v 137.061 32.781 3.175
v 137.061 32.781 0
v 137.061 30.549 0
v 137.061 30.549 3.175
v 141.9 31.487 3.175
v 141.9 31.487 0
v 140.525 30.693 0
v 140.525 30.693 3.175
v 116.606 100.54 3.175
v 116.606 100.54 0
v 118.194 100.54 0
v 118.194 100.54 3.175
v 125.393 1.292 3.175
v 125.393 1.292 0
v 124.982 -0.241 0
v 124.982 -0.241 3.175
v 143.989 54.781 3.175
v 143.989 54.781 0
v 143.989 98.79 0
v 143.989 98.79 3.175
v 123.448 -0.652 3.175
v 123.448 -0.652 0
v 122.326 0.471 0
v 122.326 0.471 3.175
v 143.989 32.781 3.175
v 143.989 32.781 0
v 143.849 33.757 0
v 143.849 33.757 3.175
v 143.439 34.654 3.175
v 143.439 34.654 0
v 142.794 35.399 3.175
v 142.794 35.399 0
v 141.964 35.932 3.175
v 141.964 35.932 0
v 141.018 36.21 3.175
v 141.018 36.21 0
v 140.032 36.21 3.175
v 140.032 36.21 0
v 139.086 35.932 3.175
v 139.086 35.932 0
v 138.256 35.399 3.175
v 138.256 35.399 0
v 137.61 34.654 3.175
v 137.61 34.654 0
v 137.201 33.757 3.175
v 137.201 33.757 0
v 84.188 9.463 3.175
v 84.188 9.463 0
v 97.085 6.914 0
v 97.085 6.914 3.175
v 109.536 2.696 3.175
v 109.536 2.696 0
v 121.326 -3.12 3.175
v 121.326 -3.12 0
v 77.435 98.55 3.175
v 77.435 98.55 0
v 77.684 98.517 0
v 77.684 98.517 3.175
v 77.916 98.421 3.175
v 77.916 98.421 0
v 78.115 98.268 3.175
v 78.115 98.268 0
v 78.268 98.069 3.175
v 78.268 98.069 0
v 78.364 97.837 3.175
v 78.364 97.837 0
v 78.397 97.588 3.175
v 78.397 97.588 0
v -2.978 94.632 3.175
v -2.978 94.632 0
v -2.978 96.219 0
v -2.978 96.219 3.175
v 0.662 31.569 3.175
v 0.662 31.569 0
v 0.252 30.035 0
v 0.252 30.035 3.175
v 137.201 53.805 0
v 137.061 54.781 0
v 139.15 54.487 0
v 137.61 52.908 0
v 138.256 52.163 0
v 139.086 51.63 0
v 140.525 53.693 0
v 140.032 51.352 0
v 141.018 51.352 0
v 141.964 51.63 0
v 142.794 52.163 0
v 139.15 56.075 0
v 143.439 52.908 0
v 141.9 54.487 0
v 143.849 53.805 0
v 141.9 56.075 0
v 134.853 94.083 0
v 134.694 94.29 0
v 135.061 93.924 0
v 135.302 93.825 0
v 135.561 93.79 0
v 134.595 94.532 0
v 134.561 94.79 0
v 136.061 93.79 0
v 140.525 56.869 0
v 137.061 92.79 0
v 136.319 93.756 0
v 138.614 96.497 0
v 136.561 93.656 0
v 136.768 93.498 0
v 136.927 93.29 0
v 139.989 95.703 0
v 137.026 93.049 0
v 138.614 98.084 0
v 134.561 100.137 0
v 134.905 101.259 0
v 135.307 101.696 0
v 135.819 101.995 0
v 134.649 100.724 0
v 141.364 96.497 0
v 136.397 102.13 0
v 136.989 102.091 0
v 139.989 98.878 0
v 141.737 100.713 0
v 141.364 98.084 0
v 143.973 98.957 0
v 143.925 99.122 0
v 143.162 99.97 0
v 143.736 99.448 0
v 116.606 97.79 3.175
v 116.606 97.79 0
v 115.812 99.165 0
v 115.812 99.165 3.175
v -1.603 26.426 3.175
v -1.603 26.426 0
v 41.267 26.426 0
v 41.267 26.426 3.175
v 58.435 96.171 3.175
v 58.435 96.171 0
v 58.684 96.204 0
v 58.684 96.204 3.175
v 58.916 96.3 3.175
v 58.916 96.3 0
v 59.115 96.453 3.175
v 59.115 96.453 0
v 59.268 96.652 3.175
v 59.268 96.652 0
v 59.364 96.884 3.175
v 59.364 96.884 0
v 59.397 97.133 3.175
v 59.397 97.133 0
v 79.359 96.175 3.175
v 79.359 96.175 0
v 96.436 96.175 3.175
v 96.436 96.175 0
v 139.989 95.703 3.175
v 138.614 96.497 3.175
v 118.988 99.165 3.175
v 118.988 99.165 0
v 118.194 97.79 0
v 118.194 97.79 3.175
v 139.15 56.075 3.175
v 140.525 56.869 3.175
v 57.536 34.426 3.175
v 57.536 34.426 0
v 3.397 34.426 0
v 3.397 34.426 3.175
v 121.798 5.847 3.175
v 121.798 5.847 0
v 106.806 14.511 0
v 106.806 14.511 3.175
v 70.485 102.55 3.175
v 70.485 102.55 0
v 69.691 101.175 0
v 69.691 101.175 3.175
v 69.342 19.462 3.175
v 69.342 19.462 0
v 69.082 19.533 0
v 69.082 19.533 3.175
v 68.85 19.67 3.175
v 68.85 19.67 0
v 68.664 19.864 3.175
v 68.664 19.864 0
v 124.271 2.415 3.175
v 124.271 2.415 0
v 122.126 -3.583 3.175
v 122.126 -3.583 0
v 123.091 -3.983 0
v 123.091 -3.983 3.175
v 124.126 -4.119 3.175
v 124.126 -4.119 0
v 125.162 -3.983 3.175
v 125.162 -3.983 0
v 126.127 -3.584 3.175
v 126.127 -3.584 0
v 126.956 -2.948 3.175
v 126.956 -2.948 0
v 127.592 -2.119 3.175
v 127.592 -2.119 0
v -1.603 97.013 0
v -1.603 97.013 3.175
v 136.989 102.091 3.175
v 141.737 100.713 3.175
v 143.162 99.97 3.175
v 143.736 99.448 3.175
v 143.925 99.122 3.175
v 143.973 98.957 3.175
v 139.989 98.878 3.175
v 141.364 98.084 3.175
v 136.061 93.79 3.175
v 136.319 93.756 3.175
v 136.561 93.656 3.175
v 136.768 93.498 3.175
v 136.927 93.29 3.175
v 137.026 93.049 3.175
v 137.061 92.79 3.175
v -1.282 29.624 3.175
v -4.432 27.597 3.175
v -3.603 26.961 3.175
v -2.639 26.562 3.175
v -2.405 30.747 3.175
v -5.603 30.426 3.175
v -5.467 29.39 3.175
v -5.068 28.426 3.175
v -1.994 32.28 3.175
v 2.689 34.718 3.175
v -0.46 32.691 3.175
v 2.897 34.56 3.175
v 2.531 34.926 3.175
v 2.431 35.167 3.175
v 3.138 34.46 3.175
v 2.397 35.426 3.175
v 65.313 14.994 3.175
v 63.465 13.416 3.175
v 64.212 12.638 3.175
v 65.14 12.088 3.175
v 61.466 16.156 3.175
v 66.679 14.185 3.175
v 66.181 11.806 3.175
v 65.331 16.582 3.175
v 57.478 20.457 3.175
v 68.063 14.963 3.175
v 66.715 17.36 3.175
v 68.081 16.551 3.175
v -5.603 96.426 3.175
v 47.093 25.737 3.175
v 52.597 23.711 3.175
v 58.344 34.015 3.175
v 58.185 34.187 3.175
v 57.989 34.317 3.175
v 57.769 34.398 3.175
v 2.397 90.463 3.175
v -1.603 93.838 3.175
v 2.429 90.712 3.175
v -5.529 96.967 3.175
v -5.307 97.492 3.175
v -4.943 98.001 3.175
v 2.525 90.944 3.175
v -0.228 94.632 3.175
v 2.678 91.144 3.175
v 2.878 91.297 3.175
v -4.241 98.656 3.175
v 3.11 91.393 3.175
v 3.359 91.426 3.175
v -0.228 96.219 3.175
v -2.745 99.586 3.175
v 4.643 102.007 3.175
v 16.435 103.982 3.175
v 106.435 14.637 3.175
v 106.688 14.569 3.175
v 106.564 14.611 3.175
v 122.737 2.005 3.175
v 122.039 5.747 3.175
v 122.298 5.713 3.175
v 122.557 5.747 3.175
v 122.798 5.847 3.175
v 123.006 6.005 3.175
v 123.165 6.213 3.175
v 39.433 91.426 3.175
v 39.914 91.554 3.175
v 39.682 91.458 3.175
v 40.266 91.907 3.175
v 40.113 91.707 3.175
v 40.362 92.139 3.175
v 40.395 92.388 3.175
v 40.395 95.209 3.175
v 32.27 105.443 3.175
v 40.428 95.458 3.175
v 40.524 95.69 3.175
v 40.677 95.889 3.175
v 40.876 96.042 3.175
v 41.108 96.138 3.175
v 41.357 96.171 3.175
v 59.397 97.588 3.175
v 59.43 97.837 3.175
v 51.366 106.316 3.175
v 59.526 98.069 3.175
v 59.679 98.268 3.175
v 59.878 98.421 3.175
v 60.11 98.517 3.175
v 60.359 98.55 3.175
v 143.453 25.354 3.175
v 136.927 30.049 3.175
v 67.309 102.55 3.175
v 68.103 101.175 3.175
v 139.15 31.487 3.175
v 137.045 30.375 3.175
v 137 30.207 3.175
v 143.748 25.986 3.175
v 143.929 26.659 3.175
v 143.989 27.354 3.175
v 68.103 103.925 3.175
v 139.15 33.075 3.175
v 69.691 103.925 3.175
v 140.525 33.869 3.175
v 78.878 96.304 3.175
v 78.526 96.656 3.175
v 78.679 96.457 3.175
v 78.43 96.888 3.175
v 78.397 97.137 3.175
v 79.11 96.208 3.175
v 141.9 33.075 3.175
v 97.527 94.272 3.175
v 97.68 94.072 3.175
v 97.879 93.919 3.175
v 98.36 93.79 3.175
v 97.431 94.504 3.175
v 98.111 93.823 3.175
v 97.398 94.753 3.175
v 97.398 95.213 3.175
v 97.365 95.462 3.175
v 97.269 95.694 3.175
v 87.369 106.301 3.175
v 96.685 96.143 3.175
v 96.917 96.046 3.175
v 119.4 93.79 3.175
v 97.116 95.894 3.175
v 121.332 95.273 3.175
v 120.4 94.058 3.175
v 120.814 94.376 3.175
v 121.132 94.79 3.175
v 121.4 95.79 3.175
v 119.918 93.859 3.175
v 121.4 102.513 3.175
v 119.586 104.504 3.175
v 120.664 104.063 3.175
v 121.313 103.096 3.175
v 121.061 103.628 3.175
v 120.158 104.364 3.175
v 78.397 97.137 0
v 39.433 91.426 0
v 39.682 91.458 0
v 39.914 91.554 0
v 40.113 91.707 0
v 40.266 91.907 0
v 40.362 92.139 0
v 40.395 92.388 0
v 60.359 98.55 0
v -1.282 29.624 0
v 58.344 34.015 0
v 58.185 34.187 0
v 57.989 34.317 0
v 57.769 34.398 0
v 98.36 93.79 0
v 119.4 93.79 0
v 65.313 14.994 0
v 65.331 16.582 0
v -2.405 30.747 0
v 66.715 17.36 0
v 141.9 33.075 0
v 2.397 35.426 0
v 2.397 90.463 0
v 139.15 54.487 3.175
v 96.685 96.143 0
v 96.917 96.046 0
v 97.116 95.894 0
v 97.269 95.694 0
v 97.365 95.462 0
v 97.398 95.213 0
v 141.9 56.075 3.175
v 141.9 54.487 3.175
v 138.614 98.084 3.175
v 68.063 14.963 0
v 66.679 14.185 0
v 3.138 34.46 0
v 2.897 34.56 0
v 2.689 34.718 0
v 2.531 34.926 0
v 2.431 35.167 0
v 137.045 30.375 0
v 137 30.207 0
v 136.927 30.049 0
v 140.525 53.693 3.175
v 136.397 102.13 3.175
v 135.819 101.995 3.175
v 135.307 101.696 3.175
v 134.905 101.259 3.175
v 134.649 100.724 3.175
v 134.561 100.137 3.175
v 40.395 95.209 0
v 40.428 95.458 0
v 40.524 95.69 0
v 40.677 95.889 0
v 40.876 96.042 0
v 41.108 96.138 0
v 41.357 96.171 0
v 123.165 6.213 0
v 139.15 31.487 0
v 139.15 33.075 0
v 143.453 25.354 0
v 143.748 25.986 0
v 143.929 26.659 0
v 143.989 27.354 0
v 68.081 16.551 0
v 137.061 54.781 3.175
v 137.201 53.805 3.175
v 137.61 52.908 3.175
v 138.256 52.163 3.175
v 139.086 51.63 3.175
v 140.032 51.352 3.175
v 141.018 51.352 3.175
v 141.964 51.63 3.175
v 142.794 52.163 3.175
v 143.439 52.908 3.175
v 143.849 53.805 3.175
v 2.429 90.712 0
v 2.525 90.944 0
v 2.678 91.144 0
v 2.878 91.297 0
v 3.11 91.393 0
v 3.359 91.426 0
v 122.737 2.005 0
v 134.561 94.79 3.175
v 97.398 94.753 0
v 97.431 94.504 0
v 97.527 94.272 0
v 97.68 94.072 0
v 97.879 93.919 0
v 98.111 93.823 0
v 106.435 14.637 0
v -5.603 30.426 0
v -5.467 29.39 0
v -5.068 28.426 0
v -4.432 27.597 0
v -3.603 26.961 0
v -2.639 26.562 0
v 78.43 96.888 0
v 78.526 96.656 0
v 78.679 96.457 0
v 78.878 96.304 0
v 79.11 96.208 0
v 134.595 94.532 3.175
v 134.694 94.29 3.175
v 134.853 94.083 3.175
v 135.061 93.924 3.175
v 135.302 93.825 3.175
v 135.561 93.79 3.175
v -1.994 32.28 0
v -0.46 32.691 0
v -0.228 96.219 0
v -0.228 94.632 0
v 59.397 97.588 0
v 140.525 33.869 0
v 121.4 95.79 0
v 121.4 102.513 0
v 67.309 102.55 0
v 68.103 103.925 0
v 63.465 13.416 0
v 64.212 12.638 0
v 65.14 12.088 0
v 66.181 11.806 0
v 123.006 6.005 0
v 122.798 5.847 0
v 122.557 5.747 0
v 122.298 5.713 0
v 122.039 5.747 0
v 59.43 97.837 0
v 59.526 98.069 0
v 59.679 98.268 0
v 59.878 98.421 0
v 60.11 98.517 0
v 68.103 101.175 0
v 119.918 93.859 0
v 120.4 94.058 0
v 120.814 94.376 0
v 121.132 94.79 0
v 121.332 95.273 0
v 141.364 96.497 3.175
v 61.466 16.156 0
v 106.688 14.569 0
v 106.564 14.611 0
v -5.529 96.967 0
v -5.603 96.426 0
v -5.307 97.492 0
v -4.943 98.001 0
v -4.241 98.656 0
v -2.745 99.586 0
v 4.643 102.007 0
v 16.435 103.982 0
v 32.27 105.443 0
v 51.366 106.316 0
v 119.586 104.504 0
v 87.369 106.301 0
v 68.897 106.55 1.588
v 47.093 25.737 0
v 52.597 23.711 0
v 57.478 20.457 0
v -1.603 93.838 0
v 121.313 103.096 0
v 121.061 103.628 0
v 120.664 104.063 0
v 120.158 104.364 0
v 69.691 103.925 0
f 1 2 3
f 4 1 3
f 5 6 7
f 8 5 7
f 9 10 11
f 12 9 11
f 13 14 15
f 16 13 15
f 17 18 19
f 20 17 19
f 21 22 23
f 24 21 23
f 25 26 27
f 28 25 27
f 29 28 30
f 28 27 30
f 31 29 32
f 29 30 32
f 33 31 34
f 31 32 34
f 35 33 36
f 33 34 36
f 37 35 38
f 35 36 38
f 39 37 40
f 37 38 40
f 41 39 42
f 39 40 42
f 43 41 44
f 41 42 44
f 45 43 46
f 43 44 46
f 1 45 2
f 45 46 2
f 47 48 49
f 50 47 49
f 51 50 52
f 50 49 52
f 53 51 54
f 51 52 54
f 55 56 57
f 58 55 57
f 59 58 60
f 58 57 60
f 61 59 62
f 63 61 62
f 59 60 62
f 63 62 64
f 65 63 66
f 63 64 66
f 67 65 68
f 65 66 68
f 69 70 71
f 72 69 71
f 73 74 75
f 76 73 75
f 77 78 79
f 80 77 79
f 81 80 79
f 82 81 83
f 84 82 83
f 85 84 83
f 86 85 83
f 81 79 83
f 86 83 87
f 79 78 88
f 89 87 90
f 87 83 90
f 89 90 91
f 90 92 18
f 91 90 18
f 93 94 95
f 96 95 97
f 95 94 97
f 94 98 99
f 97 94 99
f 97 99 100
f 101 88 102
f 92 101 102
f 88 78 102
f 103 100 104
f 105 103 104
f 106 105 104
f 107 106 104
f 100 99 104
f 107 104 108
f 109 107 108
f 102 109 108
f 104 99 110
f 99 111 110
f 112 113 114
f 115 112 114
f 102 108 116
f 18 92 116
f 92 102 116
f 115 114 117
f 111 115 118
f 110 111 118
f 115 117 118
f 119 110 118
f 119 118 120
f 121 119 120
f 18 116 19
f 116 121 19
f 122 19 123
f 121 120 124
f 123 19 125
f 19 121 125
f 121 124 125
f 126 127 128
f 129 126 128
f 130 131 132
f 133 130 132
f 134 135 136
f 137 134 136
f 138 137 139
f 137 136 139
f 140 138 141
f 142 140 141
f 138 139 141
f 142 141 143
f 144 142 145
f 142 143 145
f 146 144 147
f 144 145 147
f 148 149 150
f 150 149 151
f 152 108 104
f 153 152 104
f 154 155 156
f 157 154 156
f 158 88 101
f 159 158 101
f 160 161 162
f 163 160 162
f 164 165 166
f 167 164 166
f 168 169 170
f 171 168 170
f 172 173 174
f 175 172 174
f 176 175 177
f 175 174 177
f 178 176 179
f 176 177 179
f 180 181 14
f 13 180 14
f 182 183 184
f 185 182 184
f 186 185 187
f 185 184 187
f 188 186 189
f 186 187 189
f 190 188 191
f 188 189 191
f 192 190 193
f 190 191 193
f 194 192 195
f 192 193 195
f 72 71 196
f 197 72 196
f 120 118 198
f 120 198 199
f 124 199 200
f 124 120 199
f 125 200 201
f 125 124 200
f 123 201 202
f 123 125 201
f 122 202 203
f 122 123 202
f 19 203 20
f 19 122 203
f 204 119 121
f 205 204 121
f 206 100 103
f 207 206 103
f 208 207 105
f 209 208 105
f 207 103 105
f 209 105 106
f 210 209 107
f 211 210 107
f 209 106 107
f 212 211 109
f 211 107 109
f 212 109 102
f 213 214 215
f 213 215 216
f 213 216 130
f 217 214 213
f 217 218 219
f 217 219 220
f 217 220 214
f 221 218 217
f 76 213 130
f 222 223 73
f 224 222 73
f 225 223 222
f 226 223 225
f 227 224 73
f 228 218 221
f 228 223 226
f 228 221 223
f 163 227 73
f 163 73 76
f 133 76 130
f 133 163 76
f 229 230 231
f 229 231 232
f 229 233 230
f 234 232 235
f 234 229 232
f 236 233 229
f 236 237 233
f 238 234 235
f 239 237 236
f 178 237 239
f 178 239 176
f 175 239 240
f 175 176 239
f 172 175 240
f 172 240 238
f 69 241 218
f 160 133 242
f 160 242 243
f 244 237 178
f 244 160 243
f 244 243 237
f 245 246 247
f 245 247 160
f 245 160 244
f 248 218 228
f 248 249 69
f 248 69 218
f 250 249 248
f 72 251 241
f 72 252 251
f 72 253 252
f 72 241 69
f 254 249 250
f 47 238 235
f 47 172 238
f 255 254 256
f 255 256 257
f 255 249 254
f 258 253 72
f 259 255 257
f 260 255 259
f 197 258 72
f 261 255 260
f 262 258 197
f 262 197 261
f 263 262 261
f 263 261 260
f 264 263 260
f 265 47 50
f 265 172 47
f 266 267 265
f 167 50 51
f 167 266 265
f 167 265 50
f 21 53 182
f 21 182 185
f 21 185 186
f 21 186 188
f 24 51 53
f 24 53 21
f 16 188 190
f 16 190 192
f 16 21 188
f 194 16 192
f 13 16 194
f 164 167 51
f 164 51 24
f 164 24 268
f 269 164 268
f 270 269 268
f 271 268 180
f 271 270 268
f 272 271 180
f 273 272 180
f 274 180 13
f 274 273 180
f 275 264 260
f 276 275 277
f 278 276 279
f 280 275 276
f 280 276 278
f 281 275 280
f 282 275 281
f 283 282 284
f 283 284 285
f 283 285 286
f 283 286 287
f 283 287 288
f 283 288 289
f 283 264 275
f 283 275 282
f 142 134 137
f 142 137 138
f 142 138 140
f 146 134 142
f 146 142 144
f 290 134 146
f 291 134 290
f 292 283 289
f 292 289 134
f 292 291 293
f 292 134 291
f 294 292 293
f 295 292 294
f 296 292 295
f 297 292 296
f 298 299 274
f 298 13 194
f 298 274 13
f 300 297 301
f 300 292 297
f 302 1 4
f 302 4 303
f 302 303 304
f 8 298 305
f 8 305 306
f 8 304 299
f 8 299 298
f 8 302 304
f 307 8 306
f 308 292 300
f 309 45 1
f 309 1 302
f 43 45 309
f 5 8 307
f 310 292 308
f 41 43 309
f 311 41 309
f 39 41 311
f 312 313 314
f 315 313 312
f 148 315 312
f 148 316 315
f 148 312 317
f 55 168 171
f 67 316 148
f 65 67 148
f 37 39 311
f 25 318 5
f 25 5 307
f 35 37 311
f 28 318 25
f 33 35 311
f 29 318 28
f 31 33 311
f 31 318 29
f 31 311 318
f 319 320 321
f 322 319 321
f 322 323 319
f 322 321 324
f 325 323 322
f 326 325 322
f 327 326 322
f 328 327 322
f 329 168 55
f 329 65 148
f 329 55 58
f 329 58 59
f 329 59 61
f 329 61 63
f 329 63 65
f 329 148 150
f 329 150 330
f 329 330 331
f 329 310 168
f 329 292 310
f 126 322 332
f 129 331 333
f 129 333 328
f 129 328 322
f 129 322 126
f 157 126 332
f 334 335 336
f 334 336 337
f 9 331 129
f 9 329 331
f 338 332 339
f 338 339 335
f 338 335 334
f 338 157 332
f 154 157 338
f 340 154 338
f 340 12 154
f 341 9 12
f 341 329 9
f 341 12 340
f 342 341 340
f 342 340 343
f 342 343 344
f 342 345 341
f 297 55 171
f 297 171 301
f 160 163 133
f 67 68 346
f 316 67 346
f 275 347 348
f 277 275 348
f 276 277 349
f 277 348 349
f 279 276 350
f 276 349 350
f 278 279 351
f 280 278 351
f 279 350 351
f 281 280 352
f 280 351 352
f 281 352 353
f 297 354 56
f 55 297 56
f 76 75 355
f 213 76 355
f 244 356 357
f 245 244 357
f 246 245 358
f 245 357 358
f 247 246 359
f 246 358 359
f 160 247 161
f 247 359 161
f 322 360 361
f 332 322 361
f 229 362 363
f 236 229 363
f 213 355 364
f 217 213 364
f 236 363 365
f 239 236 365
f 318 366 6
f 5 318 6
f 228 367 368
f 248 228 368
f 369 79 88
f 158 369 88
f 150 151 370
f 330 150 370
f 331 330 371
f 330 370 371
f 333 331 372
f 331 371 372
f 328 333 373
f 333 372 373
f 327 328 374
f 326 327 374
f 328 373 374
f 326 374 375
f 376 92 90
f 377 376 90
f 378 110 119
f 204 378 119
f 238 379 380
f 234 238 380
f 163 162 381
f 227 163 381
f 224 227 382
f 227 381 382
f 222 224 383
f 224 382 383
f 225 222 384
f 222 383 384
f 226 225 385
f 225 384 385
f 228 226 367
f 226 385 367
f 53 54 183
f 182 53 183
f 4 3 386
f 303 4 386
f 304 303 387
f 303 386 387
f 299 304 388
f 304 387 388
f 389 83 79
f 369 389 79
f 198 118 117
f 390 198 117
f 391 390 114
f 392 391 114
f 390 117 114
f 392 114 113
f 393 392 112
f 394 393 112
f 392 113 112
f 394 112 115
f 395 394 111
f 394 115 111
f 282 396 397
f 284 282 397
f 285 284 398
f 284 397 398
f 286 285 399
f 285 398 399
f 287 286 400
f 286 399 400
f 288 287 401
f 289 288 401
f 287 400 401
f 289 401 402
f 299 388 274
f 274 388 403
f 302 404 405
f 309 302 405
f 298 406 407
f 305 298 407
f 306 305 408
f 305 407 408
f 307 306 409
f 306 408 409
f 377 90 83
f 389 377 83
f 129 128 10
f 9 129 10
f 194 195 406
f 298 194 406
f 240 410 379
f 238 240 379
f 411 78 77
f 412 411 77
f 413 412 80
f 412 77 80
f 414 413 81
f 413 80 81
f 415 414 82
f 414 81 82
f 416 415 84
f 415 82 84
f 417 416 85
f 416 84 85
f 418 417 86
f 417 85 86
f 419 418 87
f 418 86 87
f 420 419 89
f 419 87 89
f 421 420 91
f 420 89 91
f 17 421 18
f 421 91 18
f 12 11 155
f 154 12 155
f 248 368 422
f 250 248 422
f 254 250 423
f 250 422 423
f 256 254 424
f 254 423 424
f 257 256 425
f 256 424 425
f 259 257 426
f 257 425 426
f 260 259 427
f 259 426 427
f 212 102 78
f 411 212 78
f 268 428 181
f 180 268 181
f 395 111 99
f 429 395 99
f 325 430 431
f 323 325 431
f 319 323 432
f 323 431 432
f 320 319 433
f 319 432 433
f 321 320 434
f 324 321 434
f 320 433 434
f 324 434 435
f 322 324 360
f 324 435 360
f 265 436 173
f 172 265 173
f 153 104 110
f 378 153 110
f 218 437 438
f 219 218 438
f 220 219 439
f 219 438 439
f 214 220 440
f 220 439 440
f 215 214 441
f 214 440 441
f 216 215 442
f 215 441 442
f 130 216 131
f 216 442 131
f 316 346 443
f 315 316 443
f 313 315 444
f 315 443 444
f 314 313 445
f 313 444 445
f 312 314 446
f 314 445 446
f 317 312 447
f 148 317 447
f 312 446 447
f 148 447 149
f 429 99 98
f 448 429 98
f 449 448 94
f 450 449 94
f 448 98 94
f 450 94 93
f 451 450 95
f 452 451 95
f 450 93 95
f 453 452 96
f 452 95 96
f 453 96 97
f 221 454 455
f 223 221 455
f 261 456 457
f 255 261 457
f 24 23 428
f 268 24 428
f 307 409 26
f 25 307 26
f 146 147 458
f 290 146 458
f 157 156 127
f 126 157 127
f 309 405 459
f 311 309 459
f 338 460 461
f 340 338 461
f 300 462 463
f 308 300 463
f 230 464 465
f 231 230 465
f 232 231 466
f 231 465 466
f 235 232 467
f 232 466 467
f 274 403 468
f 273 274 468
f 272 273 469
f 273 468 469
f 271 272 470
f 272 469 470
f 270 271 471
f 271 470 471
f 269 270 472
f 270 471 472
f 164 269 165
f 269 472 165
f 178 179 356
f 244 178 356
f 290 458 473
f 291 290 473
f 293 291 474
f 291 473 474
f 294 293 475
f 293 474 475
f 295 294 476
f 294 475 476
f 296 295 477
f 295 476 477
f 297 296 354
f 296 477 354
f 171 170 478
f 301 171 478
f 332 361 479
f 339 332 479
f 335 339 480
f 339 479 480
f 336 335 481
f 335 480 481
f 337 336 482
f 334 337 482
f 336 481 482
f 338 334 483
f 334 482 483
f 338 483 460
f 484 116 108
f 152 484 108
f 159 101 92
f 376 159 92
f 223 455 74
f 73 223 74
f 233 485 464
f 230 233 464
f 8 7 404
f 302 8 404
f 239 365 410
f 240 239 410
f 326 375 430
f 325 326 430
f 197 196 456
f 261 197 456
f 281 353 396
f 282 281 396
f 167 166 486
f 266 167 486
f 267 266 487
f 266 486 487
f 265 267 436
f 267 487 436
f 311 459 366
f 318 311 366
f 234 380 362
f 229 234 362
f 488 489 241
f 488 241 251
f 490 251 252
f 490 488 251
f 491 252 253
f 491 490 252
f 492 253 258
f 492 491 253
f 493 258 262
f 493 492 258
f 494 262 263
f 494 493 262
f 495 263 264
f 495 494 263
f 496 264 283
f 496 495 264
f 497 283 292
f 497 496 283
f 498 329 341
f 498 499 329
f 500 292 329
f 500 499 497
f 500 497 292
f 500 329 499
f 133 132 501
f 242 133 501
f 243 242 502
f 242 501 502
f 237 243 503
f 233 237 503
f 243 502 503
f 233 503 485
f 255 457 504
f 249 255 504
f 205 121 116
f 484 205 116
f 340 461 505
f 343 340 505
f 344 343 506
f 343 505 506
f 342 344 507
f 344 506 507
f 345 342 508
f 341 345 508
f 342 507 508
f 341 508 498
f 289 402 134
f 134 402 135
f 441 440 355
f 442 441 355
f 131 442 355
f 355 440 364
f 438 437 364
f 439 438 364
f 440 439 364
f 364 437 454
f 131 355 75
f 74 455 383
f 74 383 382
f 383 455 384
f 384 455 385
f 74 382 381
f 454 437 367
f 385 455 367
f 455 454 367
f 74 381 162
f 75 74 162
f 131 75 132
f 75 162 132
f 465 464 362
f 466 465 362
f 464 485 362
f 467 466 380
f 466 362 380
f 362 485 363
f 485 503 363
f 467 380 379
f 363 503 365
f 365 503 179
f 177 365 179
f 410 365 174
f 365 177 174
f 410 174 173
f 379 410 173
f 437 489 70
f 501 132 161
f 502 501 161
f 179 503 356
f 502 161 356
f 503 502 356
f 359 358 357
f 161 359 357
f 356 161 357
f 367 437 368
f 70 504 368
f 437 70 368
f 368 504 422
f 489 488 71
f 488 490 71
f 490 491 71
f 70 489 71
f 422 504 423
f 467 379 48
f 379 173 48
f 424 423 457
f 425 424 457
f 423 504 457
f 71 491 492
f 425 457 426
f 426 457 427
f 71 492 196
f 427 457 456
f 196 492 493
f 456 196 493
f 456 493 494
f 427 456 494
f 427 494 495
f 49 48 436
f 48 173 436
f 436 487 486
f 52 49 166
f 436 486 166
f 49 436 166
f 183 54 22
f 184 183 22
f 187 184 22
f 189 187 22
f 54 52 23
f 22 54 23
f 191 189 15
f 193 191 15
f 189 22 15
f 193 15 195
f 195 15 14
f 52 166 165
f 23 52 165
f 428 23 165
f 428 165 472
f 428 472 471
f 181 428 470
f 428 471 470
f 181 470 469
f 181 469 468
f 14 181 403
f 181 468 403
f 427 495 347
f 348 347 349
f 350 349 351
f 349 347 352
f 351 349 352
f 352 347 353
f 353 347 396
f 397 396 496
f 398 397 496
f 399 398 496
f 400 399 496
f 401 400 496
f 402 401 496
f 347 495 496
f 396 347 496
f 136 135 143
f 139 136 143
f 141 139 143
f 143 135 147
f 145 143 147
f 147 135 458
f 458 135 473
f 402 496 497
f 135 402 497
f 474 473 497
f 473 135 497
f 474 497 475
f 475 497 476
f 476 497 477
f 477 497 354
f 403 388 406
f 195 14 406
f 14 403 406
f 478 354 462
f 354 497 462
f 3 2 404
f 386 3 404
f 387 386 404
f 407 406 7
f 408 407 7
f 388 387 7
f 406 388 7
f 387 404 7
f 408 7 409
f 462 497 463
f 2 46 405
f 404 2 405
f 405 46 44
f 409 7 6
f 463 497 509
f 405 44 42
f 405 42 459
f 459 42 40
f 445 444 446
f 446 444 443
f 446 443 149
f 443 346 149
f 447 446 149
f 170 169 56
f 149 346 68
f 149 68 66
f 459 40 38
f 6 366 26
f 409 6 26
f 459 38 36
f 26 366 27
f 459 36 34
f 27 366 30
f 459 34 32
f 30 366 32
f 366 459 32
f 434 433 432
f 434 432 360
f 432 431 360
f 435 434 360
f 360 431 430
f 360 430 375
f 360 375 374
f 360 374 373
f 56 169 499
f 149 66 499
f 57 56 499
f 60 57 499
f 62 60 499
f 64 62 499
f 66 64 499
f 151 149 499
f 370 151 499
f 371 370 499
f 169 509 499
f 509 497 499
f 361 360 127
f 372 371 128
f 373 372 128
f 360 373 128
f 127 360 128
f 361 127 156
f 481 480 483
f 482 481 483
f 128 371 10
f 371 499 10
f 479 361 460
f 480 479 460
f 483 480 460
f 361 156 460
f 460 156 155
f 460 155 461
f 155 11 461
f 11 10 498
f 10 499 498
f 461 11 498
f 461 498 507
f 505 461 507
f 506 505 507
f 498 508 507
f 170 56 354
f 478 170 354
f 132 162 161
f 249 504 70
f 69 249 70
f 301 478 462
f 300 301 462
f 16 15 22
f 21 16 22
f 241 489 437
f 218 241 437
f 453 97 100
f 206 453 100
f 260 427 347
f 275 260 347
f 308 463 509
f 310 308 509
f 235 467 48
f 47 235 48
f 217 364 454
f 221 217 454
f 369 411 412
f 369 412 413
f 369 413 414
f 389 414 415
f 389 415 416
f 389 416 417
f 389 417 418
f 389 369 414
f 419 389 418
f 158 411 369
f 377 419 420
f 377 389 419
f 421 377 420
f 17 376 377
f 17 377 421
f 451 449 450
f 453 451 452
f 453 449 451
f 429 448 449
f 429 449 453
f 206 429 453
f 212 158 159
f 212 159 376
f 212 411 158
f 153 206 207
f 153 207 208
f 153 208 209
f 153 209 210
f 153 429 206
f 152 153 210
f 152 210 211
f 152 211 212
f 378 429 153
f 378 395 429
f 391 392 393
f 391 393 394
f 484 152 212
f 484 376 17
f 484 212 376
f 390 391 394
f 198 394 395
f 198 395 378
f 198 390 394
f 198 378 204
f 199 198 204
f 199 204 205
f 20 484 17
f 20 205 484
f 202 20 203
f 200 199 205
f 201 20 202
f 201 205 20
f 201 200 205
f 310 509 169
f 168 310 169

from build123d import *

# Parameters (mm, degrees)
BOSS_EXTRUDE1_DEPTH   = 3.175
BOSS_EXTRUDE1_2_DEPTH = 3.175


with BuildPart() as part:
    # Sketch2 → Boss-Extrude1 (new body)
    with BuildSketch(Plane.XY):
        with BuildLine():
            ThreePointArc((137.06050463, 54.781066453), (140.524945013, 51.31662607), (143.989385396, 54.781066453))
            Line((143.989385396, 54.781066453), (143.989385396, 98.790469349))
            add(Edge.make_bspline(
                [(136.989277174, 102.090560266), (139.210803765, 101.602958206), (142.710857876, 100.560879885), (143.989385396, 99.398436487), (143.989385396, 98.790469349)],
                knots=[0.869738458, 0.869738458, 0.869738458, 0.869738458, 0.934869229, 1, 1, 1, 1], degree=3))
            ThreePointArc((136.989277174, 102.090560266), (135.307018509, 101.69551432), (134.560504631, 100.13706235))
            Line((134.560504631, 100.13706235), (134.560504631, 94.790469349))
            ThreePointArc((134.560504631, 94.790469349), (134.853397849, 94.083362568), (135.560504631, 93.790469349))
            Line((135.560504631, 93.790469349), (136.06050463, 93.790469349))
            ThreePointArc((136.06050463, 93.790469349), (136.767611411, 93.497576131), (137.06050463, 92.790469349))
            Line((137.06050463, 92.790469349), (137.06050463, 54.781066453))
        make_face()
        Polygon((141.899945013, 54.487209833), (140.524945013, 53.693353213), (139.149945013, 54.487209833), (139.149945013, 56.074923073), (140.524945013, 56.868779693), (141.899945013, 56.074923073), align=None, mode=Mode.SUBTRACT)
        Polygon((141.364385396, 96.496612729), (139.989385396, 95.702756109), (138.614385396, 96.496612729), (138.614385396, 98.084325969), (139.989385396, 98.87818259), (141.364385396, 98.084325969), align=None, mode=Mode.SUBTRACT)
    extrude(amount=BOSS_EXTRUDE1_DEPTH)


with BuildPart() as body_2:
    # Sketch2 → Boss-Extrude1 2 (new body)
    with BuildSketch(Plane.XY):
        with BuildLine():
            Line((2.396591635, 35.425568858), (2.396591635, 90.463437274))
            ThreePointArc((2.396591635, 90.463437274), (2.678391323, 91.143761902), (3.358715952, 91.42556159))
            Line((3.358715952, 91.42556159), (39.432907616, 91.42556159))
            ThreePointArc((39.432907616, 91.42556159), (40.113232245, 91.707361278), (40.395031933, 92.387685907))
            Line((40.395031933, 92.387685907), (40.395031933, 95.208923218))
            ThreePointArc((40.395031933, 95.208923218), (40.676831621, 95.889247847), (41.357156249, 96.171047535))
            Line((41.357156249, 96.171047535), (58.434844112, 96.171047535))
            ThreePointArc((58.434844112, 96.171047535), (59.115168741, 96.452847223), (59.396968429, 97.133171852))
            Line((59.396968429, 97.133171852), (59.396968429, 97.587767164))
            ThreePointArc((59.396968429, 97.587767164), (59.678768117, 98.268091793), (60.359092745, 98.54989148))
            Line((60.359092745, 98.54989148), (77.434844109, 98.54989148))
            ThreePointArc((77.434844109, 98.54989148), (78.115168737, 98.268091793), (78.396968425, 97.587767164))
            Line((78.396968425, 97.587767164), (78.396968425, 97.137440751))
            ThreePointArc((78.396968425, 97.137440751), (78.678768113, 96.457116122), (79.359092742, 96.175316434))
            Line((79.359092742, 96.175316434), (96.436069121, 96.175316434))
            ThreePointArc((96.436069121, 96.175316434), (97.11639375, 95.893516746), (97.398193438, 95.213192117))
            Line((97.398193438, 95.213192117), (97.398193438, 94.752593666))
            ThreePointArc((97.398193438, 94.752593666), (97.679993126, 94.072269037), (98.360317754, 93.790469349))
            Line((98.360317754, 93.790469349), (119.399952063, 93.790469349))
            ThreePointArc((119.399952063, 93.790469349), (120.814165625, 94.376255787), (121.399952063, 95.790469349))
            Line((121.399952063, 95.790469349), (121.399952063, 102.513101085))
            ThreePointArc((121.399952063, 102.513101085), (120.878338657, 103.860087751), (119.585578985, 104.504468115))
            add(Edge.make_bspline(
                [(-5.603408365, 96.42556159), (-5.603408365, 103.460733083), (49.680782472, 108.062922152), (105.592674988, 105.808828214), (119.585578985, 104.504468115)],
                knots=[0, 0, 0, 0, 0.499912399, 0.744763163, 0.744763163, 0.744763163, 0.744763163], degree=3))
            Line((-5.603408365, 96.42556159), (-5.603408365, 30.425568858))
            ThreePointArc((-5.603408365, 30.425568858), (-4.43183549, 27.597141733), (-1.603408365, 26.425568858))
            Line((-1.603408365, 26.425568858), (41.26721418, 26.425568858))
            ThreePointArc((41.26721418, 26.425568858), (52.597121833, 23.710837368), (61.46641692, 16.156224264))
            Line((61.46641692, 16.156224264), (63.465114175, 13.41553894))
            ThreePointArc((63.465114175, 13.41553894), (64.657533725, 12.331421876), (66.181004174, 11.805863146))
            Line((66.181004174, 11.805863146), (84.187939735, 9.463477264))
            ThreePointArc((84.187939735, 9.463477264), (103.379739296, 5.009808001), (121.325879515, -3.120160731))
            Line((121.325879515, -3.120160731), (122.126093986, -3.582626958))
            ThreePointArc((122.126093986, -3.582626958), (125.162033535, -3.98331921), (127.591695632, -2.119391819))
            Line((127.591695632, -2.119391819), (143.453487011, 25.354036748))
            ThreePointArc((143.453487011, 25.354036748), (143.853088701, 26.318760568), (143.989385396, 27.354036748))
            Line((143.989385396, 27.354036748), (143.989385396, 32.781066453))
            ThreePointArc((143.989385396, 32.781066453), (140.524945013, 36.245506836), (137.06050463, 32.781066453))
            Line((137.06050463, 32.781066453), (137.06050463, 30.549015646))
            ThreePointArc((137.06050463, 30.549015646), (137.026430457, 30.2901966), (136.926530034, 30.049015646))
            Line((136.926530034, 30.049015646), (123.164575325, 6.212610879))
            ThreePointArc((123.164575325, 6.212610879), (122.557159801, 5.746629031), (121.798174914, 5.846802094))
            Line((121.798174914, 5.846802094), (106.806127324, 14.511123893))
            ThreePointArc((106.806127324, 14.511123893), (106.626665922, 14.59242358), (106.434747926, 14.636960273))
            Line((106.434747926, 14.636960273), (69.342490165, 19.462011189))
            ThreePointArc((69.342490165, 19.462011189), (68.961622553, 19.593400871), (68.663517666, 19.864430137))
            Line((68.663517666, 19.864430137), (58.344093061, 34.014795074))
            ThreePointArc((58.344093061, 34.014795074), (57.989321257, 34.316979598), (57.536124951, 34.425568858))
            Line((57.536124951, 34.425568858), (3.396591635, 34.425568858))
            ThreePointArc((3.396591635, 34.425568858), (2.689484854, 34.718462076), (2.396591635, 35.425568858))
        make_face()
        Polygon((68.062825633, 14.962927216), (66.678844193, 14.184834223), (65.313005174, 14.994350811), (65.331147595, 16.581960394), (66.715129035, 17.360053387), (68.080968054, 16.550536798), align=None, mode=Mode.SUBTRACT)
        Polygon((0.251507481, 30.035119106), (-1.282105743, 29.624188681), (-2.404788541, 30.74687148), (-1.993858117, 32.280484703), (-0.460244893, 32.691415128), (0.662437906, 31.568732329), align=None, mode=Mode.SUBTRACT)
        Polygon((125.393298838, 1.29225324), (124.982036337, -0.241270965), (123.448334168, -0.651869295), (122.325894499, 0.471056581), (122.737156999, 2.004580786), (124.270859169, 2.415179116), align=None, mode=Mode.SUBTRACT)
        Polygon((141.899945013, 31.487209833), (140.524945013, 30.693353213), (139.149945013, 31.487209833), (139.149945013, 33.074923073), (140.524945013, 33.868779693), (141.899945013, 33.074923073), align=None, mode=Mode.SUBTRACT)
        Polygon((-0.228408365, 94.63170497), (-1.603408365, 93.83784835), (-2.978408365, 94.63170497), (-2.978408365, 96.219418211), (-1.603408365, 97.013274831), (-0.228408365, 96.219418211), align=None, mode=Mode.SUBTRACT)
        Polygon((70.484681667, 102.54989148), (69.690825047, 101.17489148), (68.103111807, 101.17489148), (67.309255187, 102.54989148), (68.103111807, 103.92489148), (69.690825047, 103.92489148), align=None, mode=Mode.SUBTRACT)
        Polygon((118.987665303, 99.165469349), (118.193808683, 97.790469349), (116.606095443, 97.790469349), (115.812238823, 99.165469349), (116.606095443, 100.540469349), (118.193808683, 100.540469349), align=None, mode=Mode.SUBTRACT)
    extrude(amount=BOSS_EXTRUDE1_2_DEPTH)


solid = Compound([part.part, body_2.part])
